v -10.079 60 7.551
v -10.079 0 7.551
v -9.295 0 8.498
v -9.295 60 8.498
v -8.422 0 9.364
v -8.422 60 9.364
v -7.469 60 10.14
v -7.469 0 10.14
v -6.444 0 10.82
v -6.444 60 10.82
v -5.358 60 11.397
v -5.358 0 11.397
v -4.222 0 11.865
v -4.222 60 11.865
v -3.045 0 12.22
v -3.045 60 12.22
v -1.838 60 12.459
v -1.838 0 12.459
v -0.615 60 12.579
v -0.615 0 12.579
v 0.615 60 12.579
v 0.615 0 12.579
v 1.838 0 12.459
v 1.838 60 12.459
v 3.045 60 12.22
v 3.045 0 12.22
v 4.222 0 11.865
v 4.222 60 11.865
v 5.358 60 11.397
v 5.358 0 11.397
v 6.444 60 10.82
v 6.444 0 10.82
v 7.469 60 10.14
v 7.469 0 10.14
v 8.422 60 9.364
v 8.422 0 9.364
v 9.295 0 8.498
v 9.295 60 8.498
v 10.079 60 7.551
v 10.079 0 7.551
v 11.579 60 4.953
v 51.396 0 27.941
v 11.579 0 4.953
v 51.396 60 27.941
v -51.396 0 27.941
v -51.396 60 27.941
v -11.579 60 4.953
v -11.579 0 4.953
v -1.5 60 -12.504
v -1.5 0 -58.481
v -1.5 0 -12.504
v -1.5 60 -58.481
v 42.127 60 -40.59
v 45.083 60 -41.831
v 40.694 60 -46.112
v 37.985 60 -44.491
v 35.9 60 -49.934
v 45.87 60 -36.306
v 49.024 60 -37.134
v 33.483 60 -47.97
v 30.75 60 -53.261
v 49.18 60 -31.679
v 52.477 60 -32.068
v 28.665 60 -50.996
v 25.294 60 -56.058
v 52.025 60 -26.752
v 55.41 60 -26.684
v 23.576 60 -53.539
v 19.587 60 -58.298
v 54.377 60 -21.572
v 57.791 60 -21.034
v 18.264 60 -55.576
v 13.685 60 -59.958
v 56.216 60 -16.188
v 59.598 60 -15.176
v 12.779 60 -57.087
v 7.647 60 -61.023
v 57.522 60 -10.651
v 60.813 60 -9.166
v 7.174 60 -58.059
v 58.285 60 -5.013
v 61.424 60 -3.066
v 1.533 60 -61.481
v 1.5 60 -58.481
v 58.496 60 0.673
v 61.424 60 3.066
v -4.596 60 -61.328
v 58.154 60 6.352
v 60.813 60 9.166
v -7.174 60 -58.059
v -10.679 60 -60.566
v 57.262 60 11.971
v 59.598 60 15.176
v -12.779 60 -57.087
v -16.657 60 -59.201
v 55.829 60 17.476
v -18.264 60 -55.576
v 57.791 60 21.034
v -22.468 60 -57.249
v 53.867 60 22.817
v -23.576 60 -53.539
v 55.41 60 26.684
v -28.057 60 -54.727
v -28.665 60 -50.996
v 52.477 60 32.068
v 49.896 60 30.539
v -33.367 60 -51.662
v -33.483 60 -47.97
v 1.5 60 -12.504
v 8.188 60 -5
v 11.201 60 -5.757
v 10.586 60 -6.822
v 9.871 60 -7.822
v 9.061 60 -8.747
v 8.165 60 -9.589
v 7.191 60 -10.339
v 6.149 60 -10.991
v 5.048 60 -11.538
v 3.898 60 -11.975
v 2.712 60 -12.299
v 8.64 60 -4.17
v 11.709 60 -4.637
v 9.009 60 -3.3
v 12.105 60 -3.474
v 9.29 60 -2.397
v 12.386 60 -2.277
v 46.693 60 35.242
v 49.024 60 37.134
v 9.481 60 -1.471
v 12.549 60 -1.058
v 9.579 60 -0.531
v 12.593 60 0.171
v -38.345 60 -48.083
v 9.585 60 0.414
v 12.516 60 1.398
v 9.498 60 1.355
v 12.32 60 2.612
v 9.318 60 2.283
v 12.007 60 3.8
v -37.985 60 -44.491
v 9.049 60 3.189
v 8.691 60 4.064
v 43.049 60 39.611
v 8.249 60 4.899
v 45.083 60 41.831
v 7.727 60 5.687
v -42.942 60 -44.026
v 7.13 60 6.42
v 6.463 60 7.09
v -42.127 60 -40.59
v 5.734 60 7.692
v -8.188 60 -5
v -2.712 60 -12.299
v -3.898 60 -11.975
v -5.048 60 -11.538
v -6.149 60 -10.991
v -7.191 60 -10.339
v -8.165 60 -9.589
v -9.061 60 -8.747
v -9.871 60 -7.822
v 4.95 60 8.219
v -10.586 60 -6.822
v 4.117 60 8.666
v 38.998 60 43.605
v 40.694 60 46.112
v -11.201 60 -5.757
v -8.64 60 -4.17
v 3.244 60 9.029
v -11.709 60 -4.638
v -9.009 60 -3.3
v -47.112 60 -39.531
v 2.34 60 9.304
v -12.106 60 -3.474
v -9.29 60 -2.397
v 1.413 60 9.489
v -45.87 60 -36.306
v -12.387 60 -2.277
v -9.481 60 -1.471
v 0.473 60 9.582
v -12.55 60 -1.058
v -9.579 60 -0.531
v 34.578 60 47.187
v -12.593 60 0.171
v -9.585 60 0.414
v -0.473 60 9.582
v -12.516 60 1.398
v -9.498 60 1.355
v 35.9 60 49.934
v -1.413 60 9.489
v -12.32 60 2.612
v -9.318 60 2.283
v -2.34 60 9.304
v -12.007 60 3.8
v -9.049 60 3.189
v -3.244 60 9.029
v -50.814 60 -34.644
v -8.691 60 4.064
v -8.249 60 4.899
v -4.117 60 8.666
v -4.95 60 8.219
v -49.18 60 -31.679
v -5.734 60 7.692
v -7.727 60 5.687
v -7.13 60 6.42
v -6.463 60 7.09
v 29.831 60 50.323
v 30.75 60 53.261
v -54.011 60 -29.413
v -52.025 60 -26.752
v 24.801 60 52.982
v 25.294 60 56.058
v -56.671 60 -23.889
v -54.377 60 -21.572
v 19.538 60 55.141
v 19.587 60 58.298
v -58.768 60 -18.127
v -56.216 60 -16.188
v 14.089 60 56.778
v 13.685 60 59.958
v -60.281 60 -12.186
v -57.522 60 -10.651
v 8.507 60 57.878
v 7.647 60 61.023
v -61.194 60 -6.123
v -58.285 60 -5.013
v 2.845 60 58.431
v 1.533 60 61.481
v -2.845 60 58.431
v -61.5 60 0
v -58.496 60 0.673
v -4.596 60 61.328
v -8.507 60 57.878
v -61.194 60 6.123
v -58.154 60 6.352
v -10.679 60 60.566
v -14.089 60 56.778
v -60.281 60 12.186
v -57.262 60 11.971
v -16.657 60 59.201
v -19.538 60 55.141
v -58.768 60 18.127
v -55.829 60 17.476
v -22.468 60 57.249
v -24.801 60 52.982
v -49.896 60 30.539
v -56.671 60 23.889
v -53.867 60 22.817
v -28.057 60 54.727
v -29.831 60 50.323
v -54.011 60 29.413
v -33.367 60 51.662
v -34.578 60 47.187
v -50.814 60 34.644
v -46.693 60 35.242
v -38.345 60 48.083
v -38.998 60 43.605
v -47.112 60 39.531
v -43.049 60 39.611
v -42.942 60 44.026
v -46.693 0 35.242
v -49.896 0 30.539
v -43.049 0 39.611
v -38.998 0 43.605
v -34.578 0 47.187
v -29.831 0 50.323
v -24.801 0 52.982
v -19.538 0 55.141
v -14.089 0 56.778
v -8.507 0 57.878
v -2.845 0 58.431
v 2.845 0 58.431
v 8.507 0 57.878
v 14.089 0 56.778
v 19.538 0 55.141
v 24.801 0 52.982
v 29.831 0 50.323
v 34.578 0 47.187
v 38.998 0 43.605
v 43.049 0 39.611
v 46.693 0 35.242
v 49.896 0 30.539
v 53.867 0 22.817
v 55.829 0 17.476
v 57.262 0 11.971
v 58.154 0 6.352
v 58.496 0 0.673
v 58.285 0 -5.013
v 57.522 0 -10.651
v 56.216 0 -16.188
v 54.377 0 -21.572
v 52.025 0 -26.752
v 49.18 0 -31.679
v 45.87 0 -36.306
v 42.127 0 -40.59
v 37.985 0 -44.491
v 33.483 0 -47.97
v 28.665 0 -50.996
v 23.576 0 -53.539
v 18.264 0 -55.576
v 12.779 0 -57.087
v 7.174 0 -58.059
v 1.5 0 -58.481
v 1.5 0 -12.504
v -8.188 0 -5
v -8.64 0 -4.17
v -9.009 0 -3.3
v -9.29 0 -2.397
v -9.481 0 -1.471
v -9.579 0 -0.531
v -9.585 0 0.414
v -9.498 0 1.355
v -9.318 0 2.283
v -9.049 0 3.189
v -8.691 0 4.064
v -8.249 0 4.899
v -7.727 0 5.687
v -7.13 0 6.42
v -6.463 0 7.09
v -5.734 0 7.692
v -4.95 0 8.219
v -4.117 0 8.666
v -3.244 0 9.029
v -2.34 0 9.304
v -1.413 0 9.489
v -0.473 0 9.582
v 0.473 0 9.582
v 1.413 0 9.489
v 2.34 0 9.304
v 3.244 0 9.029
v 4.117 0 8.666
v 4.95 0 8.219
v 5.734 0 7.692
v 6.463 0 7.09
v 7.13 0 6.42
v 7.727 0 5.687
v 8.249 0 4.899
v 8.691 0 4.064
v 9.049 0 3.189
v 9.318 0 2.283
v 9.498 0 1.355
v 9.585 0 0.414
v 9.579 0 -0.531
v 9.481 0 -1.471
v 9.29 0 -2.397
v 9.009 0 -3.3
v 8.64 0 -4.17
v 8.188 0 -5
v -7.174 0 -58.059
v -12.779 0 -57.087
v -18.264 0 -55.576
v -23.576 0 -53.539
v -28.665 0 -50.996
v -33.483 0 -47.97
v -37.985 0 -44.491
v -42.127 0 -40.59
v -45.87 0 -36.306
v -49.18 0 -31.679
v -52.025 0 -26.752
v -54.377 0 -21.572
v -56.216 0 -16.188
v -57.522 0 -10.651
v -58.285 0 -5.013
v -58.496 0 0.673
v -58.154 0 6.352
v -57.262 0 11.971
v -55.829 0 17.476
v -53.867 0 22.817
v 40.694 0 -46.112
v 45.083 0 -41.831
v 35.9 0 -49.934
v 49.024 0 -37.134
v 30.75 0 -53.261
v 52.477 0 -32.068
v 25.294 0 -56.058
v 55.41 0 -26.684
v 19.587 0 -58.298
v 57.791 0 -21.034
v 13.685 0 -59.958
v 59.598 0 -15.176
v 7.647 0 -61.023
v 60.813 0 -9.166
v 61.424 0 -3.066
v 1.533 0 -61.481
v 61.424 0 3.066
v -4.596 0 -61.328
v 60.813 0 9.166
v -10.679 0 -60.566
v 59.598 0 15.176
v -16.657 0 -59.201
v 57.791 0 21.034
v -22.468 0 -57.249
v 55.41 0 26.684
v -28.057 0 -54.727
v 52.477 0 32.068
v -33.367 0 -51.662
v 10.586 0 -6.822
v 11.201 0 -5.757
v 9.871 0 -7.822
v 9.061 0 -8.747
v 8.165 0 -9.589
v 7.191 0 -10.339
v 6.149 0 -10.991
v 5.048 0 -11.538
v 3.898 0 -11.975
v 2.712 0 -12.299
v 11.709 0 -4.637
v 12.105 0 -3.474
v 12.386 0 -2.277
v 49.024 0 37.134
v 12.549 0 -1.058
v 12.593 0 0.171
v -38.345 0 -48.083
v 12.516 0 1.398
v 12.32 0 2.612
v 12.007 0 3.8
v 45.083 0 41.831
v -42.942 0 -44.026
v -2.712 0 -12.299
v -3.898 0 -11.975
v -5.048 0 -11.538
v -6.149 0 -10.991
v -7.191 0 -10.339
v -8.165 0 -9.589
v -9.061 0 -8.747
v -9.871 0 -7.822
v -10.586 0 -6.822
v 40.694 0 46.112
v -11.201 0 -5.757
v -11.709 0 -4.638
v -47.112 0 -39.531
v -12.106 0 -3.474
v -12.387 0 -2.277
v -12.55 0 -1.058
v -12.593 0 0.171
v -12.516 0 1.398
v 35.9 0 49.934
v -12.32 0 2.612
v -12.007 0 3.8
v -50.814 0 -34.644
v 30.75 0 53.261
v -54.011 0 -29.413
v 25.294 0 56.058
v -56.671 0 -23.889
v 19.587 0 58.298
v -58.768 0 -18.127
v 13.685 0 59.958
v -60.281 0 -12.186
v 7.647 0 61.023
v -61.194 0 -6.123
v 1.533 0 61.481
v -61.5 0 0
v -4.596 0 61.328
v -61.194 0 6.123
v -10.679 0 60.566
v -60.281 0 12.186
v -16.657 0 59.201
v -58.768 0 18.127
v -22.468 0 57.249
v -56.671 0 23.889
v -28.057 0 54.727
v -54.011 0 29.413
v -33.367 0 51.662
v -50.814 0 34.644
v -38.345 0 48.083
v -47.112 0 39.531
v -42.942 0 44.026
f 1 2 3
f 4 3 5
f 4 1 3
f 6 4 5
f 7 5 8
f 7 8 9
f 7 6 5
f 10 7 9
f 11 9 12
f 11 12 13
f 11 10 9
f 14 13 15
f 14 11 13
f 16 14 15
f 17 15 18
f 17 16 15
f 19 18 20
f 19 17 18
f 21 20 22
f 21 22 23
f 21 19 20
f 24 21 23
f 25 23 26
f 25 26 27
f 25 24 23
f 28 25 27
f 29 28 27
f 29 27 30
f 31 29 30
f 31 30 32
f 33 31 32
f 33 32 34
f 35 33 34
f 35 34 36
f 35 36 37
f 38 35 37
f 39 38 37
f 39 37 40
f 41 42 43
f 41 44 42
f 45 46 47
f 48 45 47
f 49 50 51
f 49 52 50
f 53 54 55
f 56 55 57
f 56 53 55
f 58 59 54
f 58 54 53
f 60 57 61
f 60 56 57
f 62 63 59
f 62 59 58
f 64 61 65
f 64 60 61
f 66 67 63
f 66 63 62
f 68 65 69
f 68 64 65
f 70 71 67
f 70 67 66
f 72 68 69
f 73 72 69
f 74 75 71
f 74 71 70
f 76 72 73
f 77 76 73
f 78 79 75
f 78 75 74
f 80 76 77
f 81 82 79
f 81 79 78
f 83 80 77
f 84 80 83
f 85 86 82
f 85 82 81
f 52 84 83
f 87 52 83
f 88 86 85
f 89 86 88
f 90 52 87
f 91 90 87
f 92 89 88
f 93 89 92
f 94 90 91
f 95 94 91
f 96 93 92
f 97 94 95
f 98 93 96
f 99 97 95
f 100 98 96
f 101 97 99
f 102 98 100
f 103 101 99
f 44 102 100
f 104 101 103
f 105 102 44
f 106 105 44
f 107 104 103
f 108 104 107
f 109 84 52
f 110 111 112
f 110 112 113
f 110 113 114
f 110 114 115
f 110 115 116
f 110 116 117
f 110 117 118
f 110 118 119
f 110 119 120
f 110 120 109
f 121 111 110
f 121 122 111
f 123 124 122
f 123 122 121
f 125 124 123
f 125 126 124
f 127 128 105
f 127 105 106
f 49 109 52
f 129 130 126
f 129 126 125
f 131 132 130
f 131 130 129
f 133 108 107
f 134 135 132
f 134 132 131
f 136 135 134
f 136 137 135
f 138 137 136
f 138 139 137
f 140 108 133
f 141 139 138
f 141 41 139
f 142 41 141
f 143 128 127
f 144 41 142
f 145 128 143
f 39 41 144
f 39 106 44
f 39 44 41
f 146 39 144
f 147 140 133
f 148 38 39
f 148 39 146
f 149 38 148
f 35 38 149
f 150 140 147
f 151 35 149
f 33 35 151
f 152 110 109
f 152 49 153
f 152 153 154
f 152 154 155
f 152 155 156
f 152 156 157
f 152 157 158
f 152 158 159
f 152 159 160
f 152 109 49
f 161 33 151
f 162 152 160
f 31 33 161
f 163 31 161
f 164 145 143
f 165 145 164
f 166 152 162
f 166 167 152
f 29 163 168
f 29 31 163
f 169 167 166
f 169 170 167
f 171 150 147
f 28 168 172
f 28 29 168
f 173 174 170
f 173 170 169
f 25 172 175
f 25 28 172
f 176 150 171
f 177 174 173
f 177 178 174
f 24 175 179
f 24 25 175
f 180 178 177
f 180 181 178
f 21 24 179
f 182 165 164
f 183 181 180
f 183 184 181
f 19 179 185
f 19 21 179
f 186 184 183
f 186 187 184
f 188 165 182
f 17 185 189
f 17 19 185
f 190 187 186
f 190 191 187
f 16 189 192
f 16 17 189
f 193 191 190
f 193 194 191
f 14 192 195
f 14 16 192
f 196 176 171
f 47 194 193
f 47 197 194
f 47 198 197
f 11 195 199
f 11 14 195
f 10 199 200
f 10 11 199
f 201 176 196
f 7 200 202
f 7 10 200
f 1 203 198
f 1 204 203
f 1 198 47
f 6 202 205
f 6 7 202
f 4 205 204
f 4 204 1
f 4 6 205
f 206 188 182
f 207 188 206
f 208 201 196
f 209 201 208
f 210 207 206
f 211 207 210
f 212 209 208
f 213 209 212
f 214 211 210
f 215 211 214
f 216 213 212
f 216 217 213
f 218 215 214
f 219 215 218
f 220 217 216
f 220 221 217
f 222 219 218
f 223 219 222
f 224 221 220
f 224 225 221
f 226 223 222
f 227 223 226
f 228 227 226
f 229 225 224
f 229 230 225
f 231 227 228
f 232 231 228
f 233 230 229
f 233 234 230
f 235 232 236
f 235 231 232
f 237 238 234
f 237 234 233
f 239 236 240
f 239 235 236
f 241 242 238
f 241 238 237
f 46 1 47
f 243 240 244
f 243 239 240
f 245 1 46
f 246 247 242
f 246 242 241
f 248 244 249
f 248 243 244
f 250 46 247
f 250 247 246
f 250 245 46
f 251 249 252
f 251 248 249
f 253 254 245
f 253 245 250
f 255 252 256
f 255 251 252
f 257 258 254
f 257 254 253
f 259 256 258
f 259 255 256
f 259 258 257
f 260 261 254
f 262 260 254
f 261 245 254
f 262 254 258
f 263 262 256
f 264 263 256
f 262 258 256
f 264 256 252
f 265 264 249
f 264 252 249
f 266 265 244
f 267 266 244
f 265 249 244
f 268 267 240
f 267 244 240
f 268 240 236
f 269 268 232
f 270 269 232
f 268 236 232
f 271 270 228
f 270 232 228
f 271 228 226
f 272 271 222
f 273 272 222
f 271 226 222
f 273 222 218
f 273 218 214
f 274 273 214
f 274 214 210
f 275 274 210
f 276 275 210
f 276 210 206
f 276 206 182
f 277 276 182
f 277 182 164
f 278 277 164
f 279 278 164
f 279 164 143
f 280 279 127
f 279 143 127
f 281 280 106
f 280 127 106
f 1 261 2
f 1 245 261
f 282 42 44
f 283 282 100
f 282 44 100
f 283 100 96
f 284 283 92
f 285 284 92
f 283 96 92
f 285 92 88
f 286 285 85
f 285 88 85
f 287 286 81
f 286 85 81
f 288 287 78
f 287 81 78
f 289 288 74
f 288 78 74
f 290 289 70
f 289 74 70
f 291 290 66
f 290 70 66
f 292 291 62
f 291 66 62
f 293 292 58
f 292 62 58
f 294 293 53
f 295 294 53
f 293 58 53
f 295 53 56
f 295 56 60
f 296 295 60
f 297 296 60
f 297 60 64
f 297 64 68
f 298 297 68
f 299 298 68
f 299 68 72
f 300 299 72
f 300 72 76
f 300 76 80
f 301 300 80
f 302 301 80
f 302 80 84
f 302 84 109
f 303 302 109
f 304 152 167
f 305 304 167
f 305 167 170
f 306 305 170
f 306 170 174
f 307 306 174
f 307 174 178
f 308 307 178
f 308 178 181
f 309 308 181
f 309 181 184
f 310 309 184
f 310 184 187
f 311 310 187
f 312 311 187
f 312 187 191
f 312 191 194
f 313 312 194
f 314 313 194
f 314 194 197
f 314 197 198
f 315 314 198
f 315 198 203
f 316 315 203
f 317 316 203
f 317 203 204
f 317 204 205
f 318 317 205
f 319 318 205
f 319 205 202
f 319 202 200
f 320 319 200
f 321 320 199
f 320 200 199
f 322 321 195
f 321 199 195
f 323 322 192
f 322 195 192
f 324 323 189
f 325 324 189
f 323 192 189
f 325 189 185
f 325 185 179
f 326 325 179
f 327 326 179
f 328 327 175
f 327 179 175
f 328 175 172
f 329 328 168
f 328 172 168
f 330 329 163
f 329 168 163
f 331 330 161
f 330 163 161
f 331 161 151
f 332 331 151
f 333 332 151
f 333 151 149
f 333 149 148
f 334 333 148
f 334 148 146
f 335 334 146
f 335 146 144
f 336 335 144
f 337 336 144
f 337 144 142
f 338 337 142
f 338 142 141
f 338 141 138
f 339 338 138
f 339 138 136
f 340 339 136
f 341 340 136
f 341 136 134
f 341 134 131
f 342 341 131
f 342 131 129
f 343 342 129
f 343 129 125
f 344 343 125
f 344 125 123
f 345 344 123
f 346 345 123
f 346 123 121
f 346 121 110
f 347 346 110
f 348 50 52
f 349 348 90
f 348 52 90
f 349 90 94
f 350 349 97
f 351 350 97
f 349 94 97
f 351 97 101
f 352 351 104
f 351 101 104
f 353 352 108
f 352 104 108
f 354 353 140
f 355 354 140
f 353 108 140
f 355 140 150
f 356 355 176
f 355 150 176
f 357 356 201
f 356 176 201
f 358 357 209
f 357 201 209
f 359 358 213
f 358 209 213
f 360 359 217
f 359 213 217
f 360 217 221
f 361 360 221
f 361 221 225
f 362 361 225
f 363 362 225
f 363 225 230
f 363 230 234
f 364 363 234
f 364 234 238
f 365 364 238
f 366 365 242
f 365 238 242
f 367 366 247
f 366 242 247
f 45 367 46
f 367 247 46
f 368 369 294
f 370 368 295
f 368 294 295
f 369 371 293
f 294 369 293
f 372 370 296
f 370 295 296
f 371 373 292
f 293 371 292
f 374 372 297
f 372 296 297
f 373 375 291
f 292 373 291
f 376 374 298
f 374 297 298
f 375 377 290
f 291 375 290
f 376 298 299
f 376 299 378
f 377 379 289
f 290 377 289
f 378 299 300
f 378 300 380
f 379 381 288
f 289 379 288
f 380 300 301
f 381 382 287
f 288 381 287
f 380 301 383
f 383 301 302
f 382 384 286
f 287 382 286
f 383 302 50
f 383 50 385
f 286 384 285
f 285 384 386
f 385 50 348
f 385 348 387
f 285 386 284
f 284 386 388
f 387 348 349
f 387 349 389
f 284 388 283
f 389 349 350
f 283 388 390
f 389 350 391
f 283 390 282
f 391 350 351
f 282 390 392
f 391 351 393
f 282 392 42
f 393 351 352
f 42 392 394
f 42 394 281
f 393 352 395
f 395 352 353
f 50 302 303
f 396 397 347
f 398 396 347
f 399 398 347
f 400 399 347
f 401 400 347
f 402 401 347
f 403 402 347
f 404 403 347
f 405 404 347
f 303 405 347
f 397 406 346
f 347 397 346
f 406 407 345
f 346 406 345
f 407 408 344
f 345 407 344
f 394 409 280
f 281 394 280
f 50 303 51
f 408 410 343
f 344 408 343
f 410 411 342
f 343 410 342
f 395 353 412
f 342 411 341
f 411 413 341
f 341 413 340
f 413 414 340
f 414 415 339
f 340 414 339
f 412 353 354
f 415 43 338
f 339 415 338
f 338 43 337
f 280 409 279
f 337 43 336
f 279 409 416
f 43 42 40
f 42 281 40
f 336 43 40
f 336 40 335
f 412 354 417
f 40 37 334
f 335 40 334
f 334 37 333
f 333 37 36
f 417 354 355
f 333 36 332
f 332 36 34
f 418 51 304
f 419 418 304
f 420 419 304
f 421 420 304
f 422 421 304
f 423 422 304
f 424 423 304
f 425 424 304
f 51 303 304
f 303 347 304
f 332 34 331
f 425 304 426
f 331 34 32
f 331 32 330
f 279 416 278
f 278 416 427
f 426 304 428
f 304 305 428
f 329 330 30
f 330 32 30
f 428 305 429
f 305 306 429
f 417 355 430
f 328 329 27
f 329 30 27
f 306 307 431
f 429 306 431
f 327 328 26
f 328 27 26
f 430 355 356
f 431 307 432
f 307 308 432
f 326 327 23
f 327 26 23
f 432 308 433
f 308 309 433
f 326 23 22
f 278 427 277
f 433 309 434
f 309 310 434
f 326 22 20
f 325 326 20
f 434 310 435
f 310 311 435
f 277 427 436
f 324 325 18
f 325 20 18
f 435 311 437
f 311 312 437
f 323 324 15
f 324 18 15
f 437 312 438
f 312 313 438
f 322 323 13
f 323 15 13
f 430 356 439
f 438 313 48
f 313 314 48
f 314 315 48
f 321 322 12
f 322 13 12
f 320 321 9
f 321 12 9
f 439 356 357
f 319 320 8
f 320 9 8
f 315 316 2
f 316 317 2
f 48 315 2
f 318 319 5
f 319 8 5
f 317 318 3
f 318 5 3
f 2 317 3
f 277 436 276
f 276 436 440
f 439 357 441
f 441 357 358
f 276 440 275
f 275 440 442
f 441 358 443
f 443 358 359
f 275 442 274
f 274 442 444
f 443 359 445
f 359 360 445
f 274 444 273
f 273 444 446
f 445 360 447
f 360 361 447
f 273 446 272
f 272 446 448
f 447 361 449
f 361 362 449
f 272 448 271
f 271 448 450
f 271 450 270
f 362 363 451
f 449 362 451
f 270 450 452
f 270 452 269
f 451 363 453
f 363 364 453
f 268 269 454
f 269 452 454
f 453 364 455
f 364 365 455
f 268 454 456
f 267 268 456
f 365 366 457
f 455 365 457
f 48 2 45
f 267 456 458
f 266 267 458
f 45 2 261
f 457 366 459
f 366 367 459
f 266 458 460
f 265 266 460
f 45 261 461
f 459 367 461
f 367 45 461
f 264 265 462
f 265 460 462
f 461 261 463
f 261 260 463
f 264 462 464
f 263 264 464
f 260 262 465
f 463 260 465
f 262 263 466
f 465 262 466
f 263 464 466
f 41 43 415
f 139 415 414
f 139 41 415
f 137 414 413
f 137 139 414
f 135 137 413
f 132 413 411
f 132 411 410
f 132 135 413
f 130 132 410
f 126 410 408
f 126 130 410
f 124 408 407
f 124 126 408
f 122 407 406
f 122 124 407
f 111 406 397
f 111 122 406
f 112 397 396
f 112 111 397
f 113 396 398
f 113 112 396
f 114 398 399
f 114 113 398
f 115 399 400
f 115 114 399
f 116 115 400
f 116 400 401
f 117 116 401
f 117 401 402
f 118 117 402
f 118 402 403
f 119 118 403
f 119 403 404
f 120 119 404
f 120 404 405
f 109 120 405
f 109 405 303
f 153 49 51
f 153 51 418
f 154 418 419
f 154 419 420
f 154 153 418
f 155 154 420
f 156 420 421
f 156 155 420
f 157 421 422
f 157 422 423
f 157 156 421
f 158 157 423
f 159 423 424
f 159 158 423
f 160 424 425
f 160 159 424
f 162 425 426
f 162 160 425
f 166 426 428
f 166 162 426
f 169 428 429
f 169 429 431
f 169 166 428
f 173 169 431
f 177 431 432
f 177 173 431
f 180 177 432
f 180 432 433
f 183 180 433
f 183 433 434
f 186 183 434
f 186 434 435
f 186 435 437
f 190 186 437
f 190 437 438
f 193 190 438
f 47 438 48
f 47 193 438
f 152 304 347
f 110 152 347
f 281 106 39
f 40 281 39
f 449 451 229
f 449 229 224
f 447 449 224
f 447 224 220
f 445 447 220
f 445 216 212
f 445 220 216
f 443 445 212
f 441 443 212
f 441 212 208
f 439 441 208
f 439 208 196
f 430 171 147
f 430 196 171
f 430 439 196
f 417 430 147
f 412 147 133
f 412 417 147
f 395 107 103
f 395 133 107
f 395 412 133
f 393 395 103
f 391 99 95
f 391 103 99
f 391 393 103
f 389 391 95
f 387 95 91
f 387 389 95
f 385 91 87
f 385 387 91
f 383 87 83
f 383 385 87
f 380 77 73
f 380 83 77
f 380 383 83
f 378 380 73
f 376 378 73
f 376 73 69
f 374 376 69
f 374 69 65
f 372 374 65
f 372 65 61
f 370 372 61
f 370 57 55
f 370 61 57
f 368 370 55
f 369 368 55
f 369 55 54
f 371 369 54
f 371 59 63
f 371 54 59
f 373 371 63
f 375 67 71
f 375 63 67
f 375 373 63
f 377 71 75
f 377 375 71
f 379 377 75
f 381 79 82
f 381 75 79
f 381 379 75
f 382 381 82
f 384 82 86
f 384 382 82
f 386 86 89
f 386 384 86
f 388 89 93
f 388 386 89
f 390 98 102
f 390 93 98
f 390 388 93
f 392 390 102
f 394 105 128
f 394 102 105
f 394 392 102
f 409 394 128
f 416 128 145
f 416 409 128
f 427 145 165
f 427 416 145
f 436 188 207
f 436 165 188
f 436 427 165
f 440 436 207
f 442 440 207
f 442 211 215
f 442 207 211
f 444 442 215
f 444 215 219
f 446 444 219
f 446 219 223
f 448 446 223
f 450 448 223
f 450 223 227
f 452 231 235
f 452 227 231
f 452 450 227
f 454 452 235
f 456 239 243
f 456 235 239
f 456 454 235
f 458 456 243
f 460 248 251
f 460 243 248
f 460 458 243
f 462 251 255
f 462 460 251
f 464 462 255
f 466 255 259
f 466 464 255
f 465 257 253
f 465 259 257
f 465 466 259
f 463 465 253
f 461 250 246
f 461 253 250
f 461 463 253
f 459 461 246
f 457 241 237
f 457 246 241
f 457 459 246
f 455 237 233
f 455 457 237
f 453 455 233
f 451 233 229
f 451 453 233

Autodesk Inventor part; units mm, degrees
ref_plane "YZ Plane" through (0, 0, 0) normal (1, 0, 0) x (0, 1, 0)
ref_plane "XZ Plane" through (0, 0, 0) normal (0, 1, 0) x (-1, 0, 0)
ref_plane "XY Plane" through (0, 0, 0) normal (0, 0, 1) x (1, 0, 0)
sketch "Sketch1" plane through (0, 0, 0) normal (0, 1, 0) x (-1, 0, 0)
  circle A0 centre (0, 0) radius 61.5
  dimension "d0" = 123
extrude "Extrusion1" add sketch "Sketch1" along normal blind 60
thread "Thread1" size "M125x8" class "6g" standard "ANSI Metric M Profile" full length
sketch "Sketch2" plane through (0, 60, 0) normal (0, 1, 0) x (1, 0, 0)
  arc A0 (-8.1881, 5) -> (8.1881, 5) centre (0, 0) ccw
  line L0 (-8.1881, 5) -> (8.1881, 5)
  dimension "d5" = 19.188
  dimension "d6" = 5
extrude "Extrusion2" cut sketch "Sketch2" against normal up to surface (60 mm away)
sketch "Sketch3" plane through (0, 60, 0) normal (0, 1, 0) x (1, 0, 0)
  line L0 (-8.1881, 5) -> (8.1881, 5) projected
  arc A0 (-8.1881, 5) -> (8.1881, 5) centre (0, 0) ccw projected
  circle A1 centre (0, 0) radius 61.5 projected
  line L1 (-1.5, 58.4808) -> (-1.5, 12.5044)
  line L2 (1.5, 58.4808) -> (1.5, 12.5044)
  line L3 (-49.8958, -30.5394) -> (-10.0791, -7.5512)
  line L4 (-51.3958, -27.9413) -> (-11.5791, -4.9531)
  line L5 (51.3958, -27.9413) -> (11.5791, -4.9531)
  line L6 (49.8958, -30.5394) -> (10.0791, -7.5512)
  arc A2 (11.5791, -4.9531) -> (1.5, 12.5044) centre (0, 0) ccw
  arc A3 (-1.5, 12.5044) -> (-11.5791, -4.9531) centre (0, 0) ccw
  arc A4 (-10.0791, -7.5512) -> (10.0791, -7.5512) centre (0, 0) ccw
  arc A5 (-49.8958, -30.5394) -> (49.8958, -30.5394) centre (0, 0) ccw
  arc A6 (51.3958, -27.9413) -> (1.5, 58.4808) centre (0, 0) ccw
  arc A7 (-1.5, 58.4808) -> (-51.3958, -27.9413) centre (0, 0) ccw
  dimension "d11" = 3
  dimension "d14" = 360
extrude "Extrusion3" cut sketch "Sketch3" against normal through all contours L1 A3 L4 A7 | A6 L5 A2 L2 | L3 A4 L6 A5
properties part number "Wheel_Actual-wheel-ENES100OSVproject-spencermical-3-3-16_thursday-1-17am-freshmanyear-springsemester"
